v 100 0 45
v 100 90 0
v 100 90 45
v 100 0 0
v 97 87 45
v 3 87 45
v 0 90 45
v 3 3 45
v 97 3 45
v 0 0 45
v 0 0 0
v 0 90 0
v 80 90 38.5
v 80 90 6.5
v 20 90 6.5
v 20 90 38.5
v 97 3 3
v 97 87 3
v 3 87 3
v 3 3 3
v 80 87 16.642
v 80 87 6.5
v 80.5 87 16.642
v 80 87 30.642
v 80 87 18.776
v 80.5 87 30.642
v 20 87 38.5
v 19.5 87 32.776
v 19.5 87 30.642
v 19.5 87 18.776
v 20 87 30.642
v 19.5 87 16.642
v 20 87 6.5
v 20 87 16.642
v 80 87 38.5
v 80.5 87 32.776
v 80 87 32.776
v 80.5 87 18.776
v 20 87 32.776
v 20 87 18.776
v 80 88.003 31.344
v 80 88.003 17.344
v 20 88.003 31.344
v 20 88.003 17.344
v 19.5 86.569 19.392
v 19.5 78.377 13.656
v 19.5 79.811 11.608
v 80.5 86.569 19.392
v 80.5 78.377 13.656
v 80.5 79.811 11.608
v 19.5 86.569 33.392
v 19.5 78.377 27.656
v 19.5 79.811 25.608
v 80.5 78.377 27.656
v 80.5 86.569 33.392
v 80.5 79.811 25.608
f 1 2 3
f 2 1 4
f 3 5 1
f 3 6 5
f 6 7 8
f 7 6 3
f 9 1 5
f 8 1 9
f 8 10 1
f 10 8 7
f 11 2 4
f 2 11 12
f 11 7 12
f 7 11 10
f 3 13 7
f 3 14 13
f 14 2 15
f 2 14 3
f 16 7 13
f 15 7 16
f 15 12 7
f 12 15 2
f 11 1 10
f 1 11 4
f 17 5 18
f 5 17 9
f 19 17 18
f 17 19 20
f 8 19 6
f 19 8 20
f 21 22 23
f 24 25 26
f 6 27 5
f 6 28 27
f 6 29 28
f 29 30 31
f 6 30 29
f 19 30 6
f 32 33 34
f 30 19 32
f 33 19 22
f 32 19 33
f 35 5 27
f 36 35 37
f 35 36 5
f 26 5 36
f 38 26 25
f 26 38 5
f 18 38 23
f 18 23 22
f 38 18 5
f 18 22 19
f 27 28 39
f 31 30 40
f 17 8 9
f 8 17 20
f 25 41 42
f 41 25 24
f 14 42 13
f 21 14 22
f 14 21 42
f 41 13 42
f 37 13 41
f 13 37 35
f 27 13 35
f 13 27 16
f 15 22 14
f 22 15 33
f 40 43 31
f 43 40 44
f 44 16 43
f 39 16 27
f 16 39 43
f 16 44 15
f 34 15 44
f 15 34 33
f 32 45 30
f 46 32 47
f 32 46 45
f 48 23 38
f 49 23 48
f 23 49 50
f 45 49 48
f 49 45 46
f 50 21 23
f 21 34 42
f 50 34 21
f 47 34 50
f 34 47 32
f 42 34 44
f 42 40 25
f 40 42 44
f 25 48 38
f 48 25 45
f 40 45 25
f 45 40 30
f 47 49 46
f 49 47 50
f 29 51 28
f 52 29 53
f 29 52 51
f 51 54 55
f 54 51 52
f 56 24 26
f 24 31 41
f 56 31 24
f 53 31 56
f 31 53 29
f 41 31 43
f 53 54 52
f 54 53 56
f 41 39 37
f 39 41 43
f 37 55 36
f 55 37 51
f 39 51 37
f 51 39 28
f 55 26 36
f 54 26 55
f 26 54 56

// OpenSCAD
$fn = 32;

// ----------------------------------------------------------------------
// Vent box: louvers enclosure
// ----------------------------------------------------------------------

// --- parameters (mm) ---
box_l = 100;              // box length, X
box_w = 90;               // box width, Y
box_h = 45;               // box height, Z
wall_t = 3;               // shell wall thickness
win_l = 60;               // vent window width, X
win_h = 32;               // vent window height, Z
slat_t = 2.5;             // louver slat thickness
slat_d = 10;              // louver slat depth
slat_a = 35;              // louver slat angle, degrees
slat_pitch = 14;          // louver pitch
slat_yc = 83.19;          // slat centreline Y

win_z0 = (box_h - win_h) / 2;  // window lower edge Z
n_slats = 2;  // louver count
slat_z0 = win_z0 + (win_h - (n_slats - 1) * slat_pitch) / 2;

difference() {
  union() {
    difference() {
      cube([box_l, box_w, box_h]);
  translate([wall_t, wall_t, wall_t])
    cube([box_l - 2 * wall_t, box_w - 2 * wall_t, box_h]);
  translate([(box_l - win_l) / 2, box_w - wall_t - 1, win_z0])
    cube([win_l, wall_t + 2, win_h]);
    }
    for (i = [0 : n_slats - 1])
      translate([box_l / 2, slat_yc, slat_z0 + i * slat_pitch])
        rotate([slat_a, 0, 0])
          cube([win_l + 1, slat_d, slat_t], center = true);
  }
}
